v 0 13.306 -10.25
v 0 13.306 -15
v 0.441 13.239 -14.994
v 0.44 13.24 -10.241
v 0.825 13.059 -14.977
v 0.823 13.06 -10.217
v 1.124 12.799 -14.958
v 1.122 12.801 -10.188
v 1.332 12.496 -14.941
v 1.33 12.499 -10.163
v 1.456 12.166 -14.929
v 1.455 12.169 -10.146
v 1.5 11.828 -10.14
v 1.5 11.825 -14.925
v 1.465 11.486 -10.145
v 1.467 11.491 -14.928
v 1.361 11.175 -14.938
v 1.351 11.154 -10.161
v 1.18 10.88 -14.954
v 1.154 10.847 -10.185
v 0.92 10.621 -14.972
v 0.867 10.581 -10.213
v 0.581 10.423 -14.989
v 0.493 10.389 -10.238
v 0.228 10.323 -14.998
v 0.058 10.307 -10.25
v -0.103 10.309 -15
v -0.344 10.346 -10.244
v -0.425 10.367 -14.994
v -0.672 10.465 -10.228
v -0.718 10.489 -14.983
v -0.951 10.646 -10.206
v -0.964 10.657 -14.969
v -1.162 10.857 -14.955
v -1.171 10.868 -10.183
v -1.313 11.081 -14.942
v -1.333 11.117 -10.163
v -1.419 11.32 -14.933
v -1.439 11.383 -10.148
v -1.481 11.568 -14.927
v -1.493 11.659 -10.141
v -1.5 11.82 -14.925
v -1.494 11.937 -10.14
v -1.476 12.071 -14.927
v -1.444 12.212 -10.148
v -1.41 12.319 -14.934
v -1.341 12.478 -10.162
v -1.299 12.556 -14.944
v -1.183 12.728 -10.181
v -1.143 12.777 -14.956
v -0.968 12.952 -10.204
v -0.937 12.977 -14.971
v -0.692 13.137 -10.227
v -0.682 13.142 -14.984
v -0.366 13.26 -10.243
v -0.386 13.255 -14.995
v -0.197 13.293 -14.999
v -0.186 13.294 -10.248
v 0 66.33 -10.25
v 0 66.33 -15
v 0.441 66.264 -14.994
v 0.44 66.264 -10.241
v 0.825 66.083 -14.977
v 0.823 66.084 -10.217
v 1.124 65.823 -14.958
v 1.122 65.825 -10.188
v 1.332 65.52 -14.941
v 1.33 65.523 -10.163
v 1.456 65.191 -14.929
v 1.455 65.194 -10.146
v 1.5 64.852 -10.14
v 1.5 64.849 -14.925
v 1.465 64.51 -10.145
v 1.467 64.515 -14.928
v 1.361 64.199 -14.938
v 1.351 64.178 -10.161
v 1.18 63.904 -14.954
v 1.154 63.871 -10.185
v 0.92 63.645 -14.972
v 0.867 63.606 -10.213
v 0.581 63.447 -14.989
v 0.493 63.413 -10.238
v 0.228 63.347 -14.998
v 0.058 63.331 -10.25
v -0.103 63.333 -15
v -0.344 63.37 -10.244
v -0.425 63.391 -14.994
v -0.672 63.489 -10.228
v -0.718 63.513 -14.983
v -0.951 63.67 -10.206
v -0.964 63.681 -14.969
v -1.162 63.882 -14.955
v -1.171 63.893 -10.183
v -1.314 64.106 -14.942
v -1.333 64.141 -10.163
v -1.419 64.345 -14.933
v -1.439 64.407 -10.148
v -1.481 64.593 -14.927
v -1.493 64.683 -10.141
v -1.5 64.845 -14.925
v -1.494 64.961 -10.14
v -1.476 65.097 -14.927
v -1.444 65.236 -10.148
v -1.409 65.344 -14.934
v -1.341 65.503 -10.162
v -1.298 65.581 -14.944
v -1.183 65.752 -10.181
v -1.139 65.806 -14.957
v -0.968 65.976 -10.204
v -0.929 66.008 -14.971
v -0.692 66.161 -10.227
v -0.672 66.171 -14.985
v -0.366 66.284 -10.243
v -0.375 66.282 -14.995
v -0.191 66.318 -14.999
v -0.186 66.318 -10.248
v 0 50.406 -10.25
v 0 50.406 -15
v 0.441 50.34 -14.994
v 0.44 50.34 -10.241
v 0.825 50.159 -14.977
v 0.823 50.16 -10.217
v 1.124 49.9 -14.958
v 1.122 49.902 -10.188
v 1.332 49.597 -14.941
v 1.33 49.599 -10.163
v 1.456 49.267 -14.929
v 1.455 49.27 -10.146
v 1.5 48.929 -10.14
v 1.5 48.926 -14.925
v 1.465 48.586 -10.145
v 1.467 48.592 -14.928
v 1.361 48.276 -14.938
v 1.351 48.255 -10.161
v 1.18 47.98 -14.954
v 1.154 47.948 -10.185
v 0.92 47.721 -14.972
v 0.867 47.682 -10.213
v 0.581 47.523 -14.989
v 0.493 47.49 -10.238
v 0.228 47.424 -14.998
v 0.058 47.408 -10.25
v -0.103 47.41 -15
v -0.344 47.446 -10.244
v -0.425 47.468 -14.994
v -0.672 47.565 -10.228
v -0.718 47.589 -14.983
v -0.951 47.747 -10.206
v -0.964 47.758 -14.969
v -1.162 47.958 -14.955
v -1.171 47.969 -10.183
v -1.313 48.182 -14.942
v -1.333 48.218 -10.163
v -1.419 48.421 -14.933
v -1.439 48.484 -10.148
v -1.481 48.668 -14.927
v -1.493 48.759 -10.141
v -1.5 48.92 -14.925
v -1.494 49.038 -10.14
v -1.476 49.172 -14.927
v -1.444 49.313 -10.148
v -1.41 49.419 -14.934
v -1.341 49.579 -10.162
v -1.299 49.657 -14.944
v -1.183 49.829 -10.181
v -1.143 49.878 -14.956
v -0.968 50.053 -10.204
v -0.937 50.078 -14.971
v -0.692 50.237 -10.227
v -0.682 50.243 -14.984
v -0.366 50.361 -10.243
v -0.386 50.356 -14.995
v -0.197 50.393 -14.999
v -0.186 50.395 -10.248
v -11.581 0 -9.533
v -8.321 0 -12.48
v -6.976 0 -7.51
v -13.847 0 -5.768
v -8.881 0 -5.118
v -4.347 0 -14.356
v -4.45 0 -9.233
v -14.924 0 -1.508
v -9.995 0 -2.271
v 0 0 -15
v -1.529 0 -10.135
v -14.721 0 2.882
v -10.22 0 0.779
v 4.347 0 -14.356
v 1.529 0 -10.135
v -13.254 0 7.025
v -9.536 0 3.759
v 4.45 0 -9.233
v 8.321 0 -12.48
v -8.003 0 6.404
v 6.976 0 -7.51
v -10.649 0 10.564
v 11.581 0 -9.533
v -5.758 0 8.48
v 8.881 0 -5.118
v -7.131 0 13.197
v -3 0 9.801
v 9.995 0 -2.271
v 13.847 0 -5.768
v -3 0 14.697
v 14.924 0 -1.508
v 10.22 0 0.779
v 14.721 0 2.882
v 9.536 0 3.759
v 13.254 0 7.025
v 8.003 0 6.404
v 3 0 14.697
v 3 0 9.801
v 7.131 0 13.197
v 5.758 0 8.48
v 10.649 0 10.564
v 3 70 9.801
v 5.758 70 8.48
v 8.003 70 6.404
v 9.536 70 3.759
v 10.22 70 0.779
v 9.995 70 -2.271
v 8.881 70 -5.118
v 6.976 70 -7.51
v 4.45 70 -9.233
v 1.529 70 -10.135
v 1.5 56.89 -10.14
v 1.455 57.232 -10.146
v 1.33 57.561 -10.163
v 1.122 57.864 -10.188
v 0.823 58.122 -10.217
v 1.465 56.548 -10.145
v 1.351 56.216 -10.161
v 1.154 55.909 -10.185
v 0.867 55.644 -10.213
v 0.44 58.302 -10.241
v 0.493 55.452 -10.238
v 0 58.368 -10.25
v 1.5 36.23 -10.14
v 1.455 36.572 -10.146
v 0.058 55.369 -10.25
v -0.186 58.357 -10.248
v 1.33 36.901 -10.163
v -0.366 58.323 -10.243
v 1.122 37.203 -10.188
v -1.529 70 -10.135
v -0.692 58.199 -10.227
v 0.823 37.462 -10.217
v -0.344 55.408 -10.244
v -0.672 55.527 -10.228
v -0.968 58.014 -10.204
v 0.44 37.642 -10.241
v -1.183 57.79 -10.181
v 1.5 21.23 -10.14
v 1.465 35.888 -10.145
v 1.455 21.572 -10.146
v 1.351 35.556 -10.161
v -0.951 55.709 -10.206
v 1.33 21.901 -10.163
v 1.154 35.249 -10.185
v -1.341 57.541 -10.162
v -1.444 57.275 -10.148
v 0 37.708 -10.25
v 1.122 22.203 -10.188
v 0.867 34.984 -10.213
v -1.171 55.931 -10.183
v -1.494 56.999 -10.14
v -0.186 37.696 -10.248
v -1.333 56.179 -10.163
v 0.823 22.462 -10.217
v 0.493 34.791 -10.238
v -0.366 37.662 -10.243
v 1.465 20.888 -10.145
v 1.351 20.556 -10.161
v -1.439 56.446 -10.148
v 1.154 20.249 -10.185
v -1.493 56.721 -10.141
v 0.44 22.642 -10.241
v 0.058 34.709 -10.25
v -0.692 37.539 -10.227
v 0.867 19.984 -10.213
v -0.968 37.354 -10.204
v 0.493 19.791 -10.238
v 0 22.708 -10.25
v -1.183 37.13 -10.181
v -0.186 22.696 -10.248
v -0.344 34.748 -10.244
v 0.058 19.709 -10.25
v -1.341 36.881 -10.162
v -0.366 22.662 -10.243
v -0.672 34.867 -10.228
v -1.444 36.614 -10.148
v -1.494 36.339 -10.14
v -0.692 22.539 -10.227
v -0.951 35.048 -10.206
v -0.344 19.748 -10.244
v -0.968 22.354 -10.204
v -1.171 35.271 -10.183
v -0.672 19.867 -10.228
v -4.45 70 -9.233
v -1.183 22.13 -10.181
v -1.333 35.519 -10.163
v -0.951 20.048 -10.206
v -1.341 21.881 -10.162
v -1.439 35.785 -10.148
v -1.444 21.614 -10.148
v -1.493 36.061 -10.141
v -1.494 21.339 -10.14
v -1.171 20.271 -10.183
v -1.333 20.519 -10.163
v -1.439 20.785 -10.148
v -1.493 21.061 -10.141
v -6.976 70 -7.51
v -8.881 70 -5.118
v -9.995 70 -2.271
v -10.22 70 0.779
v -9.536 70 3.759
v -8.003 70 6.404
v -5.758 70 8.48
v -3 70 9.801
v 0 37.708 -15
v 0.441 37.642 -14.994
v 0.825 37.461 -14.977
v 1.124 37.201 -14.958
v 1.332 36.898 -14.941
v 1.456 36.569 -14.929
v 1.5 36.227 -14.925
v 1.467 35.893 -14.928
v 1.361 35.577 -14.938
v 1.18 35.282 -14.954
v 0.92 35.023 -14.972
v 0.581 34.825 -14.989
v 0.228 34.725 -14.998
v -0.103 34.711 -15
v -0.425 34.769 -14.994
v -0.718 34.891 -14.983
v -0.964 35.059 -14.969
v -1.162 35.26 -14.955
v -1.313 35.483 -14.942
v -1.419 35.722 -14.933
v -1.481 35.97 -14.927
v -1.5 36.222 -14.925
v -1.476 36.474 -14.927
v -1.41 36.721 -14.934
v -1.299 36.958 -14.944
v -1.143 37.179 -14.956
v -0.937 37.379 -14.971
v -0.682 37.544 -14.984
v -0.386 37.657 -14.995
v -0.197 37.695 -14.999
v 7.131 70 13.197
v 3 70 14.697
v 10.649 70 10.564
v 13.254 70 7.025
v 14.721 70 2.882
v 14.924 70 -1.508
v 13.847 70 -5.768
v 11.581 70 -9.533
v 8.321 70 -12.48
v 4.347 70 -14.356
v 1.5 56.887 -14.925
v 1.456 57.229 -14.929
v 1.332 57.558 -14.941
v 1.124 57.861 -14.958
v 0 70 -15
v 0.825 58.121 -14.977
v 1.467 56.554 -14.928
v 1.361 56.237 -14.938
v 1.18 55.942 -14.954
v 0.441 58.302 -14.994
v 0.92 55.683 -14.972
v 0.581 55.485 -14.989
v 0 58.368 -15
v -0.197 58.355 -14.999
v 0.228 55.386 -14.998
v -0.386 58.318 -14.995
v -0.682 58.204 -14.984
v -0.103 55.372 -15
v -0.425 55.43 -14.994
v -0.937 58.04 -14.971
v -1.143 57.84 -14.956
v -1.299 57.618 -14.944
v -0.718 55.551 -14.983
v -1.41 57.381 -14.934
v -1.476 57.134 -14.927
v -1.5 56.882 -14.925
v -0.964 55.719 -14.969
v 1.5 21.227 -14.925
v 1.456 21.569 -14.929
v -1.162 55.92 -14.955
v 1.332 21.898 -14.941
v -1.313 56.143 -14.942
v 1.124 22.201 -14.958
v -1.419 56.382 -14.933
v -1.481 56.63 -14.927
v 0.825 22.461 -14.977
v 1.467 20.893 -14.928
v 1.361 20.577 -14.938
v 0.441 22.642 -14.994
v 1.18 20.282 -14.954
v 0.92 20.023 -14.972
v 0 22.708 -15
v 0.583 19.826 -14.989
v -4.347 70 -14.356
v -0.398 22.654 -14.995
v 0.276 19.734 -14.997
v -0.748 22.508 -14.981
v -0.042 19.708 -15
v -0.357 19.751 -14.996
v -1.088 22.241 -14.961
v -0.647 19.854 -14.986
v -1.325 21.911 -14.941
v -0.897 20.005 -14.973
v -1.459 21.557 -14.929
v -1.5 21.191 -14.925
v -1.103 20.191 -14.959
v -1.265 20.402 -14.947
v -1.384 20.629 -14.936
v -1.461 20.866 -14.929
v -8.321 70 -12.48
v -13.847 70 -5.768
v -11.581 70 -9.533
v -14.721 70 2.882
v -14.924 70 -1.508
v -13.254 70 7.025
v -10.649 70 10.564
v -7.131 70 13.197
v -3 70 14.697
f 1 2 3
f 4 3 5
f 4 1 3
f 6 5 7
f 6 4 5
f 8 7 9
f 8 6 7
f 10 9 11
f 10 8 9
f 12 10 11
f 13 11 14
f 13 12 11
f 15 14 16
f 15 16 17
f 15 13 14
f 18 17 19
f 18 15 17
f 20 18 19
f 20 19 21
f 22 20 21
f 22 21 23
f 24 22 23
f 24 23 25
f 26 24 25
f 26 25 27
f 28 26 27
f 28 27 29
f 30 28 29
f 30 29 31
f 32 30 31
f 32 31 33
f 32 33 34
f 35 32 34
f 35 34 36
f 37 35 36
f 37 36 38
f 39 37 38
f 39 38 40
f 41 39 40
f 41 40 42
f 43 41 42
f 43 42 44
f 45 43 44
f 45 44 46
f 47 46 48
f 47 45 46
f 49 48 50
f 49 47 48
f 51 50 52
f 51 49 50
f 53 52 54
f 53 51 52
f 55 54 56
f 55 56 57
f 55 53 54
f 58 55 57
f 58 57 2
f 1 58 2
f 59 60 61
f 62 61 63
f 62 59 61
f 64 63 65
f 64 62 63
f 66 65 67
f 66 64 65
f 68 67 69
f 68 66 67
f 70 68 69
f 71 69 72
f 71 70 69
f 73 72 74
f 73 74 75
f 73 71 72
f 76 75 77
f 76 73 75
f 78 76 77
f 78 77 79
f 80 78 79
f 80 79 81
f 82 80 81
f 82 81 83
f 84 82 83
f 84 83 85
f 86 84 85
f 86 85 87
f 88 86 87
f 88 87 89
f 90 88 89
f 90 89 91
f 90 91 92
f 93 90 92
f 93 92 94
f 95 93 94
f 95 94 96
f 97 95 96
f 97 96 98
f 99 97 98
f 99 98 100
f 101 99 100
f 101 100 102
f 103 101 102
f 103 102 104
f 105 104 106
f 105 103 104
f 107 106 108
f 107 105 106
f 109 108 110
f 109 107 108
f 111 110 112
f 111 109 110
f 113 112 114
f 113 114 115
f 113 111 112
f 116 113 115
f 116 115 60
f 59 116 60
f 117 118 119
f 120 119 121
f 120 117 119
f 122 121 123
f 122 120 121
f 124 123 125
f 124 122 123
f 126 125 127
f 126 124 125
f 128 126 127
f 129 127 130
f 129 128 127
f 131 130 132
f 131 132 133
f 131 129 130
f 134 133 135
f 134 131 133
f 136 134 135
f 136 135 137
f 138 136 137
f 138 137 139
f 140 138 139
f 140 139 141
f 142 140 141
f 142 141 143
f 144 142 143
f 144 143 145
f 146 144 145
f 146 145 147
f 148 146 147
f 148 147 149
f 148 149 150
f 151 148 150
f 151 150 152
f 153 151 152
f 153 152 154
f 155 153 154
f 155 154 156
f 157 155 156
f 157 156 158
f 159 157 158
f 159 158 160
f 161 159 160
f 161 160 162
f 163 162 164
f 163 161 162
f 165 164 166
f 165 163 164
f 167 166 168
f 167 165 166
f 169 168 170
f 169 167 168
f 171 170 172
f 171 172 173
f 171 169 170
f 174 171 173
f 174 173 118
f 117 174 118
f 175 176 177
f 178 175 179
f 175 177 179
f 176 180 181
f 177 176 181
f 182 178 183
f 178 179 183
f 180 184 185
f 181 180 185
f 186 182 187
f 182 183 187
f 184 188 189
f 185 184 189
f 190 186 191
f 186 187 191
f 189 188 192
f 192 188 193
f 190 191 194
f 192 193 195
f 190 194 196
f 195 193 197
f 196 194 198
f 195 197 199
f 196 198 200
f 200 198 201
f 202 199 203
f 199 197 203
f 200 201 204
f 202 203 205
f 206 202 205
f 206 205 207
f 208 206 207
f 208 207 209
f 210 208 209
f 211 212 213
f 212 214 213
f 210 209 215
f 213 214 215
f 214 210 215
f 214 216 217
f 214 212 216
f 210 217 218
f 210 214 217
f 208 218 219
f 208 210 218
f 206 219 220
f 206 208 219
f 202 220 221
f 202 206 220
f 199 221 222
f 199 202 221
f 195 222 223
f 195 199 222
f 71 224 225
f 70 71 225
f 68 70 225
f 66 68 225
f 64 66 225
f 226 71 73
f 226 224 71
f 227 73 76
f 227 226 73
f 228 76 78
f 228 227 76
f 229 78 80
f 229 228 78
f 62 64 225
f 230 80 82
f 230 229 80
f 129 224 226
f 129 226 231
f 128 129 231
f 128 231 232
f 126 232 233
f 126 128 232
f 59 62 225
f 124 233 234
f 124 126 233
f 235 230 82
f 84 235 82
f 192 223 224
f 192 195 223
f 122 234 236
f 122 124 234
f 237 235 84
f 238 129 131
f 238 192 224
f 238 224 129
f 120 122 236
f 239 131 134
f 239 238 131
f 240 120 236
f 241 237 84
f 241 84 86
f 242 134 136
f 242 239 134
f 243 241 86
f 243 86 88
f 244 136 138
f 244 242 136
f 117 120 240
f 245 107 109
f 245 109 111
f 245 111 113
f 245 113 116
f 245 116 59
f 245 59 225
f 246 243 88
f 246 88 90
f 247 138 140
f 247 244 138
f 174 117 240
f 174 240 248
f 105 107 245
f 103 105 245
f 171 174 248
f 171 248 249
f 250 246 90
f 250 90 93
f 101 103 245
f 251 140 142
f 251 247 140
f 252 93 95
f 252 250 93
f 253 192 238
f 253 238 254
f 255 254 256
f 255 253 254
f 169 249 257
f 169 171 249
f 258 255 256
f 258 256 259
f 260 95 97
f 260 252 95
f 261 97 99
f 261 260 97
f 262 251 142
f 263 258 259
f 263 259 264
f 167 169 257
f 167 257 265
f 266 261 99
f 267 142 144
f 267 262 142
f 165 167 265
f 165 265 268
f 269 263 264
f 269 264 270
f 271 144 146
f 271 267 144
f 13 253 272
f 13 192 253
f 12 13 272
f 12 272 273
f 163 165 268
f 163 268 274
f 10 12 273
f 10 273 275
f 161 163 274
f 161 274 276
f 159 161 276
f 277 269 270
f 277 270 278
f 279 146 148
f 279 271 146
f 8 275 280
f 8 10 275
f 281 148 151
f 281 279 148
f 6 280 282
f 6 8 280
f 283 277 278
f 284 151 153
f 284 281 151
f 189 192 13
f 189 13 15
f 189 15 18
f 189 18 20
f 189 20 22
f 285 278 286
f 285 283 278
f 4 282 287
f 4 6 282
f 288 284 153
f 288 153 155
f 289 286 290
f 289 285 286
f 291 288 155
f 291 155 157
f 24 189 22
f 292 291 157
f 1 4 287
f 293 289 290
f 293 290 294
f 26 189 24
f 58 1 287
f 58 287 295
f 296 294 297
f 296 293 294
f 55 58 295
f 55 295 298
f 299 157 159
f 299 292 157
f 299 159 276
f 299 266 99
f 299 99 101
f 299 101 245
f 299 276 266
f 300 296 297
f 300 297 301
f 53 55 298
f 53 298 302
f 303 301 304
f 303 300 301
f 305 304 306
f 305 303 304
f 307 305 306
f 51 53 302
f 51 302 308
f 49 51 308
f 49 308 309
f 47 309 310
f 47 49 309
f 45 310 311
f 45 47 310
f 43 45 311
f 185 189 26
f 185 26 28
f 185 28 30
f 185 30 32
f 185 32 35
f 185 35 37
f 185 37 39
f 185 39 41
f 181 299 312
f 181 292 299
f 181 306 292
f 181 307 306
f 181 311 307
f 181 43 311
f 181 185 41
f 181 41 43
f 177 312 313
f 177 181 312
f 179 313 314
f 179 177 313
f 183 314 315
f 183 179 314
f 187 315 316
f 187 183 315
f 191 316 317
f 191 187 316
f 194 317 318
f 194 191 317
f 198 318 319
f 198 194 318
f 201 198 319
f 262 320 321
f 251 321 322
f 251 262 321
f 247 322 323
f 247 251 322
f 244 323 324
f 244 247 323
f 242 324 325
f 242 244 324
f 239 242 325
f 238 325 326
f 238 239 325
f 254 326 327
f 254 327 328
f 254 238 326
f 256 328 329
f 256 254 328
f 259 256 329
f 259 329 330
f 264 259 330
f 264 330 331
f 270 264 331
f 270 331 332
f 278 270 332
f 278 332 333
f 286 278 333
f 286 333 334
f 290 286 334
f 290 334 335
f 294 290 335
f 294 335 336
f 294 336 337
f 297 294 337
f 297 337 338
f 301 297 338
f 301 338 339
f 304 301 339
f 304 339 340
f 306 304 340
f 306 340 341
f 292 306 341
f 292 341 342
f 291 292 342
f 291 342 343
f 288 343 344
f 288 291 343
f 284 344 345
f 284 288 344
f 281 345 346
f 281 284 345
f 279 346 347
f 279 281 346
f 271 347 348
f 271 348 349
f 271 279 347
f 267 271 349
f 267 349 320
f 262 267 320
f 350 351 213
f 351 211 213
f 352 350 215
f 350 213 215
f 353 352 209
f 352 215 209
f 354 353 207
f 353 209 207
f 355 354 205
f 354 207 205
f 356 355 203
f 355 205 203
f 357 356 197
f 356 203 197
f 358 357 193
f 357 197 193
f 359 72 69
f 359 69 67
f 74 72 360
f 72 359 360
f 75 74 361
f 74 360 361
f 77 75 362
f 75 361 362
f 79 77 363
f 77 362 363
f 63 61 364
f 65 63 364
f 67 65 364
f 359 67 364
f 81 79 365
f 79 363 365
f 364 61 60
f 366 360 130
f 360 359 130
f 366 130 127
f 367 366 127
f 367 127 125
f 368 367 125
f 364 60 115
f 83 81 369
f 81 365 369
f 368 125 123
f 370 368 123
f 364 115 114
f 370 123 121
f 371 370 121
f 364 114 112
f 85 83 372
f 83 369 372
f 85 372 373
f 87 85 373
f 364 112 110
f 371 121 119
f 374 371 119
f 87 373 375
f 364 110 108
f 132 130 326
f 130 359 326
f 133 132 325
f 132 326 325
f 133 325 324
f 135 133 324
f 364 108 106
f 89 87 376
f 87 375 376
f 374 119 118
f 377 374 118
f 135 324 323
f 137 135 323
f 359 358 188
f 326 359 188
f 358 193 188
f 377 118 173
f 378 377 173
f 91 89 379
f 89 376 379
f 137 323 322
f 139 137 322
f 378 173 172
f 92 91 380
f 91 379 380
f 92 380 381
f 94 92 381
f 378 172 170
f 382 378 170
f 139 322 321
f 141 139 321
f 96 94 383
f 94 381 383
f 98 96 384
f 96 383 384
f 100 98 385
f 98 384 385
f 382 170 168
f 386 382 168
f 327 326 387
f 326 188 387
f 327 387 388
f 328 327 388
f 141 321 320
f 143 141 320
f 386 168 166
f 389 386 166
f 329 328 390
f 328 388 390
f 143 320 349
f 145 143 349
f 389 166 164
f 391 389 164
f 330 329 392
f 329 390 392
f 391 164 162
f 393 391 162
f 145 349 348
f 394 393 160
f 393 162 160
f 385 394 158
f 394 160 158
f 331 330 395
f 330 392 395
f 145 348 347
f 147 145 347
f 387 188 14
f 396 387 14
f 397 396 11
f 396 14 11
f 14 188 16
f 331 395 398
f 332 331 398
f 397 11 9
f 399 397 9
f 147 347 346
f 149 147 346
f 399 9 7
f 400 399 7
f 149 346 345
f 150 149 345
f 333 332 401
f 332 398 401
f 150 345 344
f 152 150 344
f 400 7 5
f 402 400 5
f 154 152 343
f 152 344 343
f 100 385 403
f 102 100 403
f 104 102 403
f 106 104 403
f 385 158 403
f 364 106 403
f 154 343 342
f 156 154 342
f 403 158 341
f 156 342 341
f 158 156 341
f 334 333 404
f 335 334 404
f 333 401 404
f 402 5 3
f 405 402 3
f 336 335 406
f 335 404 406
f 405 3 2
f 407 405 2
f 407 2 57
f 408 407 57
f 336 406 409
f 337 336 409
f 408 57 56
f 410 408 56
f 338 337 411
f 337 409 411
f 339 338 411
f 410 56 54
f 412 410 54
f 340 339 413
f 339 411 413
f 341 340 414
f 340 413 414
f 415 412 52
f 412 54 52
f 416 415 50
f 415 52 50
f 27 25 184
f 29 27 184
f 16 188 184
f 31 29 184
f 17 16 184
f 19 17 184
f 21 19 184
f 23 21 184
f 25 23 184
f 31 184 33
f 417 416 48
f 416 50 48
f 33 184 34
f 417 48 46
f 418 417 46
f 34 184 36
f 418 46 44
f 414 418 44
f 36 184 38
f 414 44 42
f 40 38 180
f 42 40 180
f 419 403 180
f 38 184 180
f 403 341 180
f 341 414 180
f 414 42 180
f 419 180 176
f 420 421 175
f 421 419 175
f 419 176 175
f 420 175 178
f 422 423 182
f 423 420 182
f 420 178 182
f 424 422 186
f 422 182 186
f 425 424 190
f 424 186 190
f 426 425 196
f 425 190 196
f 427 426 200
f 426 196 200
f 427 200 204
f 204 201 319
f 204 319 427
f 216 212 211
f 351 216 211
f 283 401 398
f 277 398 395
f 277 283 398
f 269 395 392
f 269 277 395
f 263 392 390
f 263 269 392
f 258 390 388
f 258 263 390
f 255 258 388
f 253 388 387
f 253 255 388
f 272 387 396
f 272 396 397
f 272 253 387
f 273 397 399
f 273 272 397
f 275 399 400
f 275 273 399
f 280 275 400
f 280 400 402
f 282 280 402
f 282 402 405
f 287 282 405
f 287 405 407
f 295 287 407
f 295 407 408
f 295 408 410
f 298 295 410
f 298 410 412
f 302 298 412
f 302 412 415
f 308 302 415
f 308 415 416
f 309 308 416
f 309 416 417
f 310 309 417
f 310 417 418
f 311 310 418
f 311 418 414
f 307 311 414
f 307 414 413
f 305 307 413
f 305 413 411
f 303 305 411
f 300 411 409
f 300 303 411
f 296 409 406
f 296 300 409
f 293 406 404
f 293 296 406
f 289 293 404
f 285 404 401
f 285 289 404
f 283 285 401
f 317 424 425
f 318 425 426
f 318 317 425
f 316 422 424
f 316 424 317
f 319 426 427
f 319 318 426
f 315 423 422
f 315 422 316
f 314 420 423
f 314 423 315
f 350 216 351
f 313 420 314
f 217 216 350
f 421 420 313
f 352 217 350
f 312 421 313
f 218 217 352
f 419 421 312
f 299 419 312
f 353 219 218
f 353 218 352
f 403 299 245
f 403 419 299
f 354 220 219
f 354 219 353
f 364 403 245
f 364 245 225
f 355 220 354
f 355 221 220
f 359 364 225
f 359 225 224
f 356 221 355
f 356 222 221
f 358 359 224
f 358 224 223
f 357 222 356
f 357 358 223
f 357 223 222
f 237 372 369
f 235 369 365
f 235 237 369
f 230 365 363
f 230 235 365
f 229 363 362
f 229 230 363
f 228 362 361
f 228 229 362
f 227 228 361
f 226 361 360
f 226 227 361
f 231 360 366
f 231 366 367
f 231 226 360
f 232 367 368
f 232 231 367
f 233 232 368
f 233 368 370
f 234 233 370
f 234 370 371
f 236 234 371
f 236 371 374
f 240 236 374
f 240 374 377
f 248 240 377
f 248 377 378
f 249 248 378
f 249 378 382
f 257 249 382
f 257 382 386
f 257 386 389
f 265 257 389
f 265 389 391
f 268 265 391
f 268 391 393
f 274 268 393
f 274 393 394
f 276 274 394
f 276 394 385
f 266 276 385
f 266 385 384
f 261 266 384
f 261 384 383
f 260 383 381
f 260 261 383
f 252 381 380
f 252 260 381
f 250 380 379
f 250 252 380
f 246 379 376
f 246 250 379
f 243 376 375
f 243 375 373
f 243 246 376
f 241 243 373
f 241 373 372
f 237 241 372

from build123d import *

# Parameters (mm, degrees)
SKETCH_1_R               = 15
SKETCH_1_R_2             = 10.25
EXTRUDE_1_DEPTH          = 150
CUT_EXTRUDE_1_DEPTH      = 154.703965854
CUT_EXTRUDE_1_DEPTH_BACK = 154.703965854
SKETCH_2_R               = 1.5
SKETCH_3_R               = 22.14266171
CUT_EXTRUDE_2_DEPTH      = 80
SKETCH_5_W               = 6
SKETCH_5_H               = 5.980913868
CUT_EXTRUDE_3_DEPTH      = 80


with BuildPart() as part:
    # 스케치1 → 보스-돌출1 (new body)
    with BuildSketch(Plane(origin=(0, 0, 0), x_dir=(1, 0, 0), z_dir=(0, 1, 0))):
        with Locations(Location((0, 0, 0), (0, 0, 270))):
            Circle(SKETCH_1_R)
        with Locations(Location((0, 0, 0), (0, 0, 270))):
            Circle(SKETCH_1_R_2, mode=Mode.SUBTRACT)
    extrude(amount=EXTRUDE_1_DEPTH)

    # 스케치2 → 컷-돌출1 (cut, two sides: drawn at the far end of the back side and taken through both)
    with BuildSketch(Plane(origin=(0, 0, -14.998485281), x_dir=(-1, 0, 0), z_dir=(0, 0, -1)).offset(-CUT_EXTRUDE_1_DEPTH_BACK)):
        with Locations(Location((0, 11.805761924, 0), (0, 0, 90))):
            Circle(SKETCH_2_R)
        with Locations(Location((0, 21.207864132, 0), (0, 0, 90))):
            Circle(SKETCH_2_R)
        with Locations(Location((0, 36.207864132, 0), (0, 0, 90))):
            Circle(SKETCH_2_R)
        with Locations(Location((0, 48.906437248, 0), (0, 0, 90))):
            Circle(SKETCH_2_R)
        with Locations(Location((0, 56.868147497, 0), (0, 0, 90))):
            Circle(SKETCH_2_R)
        with Locations(Location((0, 64.829857746, 0), (0, 0, 90))):
            Circle(SKETCH_2_R)
        with Locations(Location((0, 77.054405077, 0), (0, 0, 90))):
            Circle(SKETCH_2_R)
        with Locations(Location((0, 91.899672592, 0), (0, 0, 90))):
            Circle(SKETCH_2_R)
        with Locations(Location((0, 106.761531723, 0), (0, 0, 90))):
            Circle(SKETCH_2_R)
        with Locations(Location((0, 122.331098432, 0), (0, 0, 90))):
            Circle(SKETCH_2_R)
        with Locations(Location((0, 136.839103775, 0), (0, 0, 90))):
            Circle(SKETCH_2_R)
    extrude(amount=CUT_EXTRUDE_1_DEPTH + CUT_EXTRUDE_1_DEPTH_BACK, mode=Mode.SUBTRACT)

    # 스케치3 → 컷-돌출2 (cut)
    with BuildSketch(Plane(origin=(0, 150, 0), x_dir=(1, 0, 0), z_dir=(0, 1, 0))):
        Circle(SKETCH_3_R)
    extrude(amount=-CUT_EXTRUDE_2_DEPTH, mode=Mode.SUBTRACT)

    # 스케치5 → 컷-돌출3 (cut)
    with BuildSketch(Plane.XZ):
        with Locations((0, 12.107840203)):
            Rectangle(SKETCH_5_W, SKETCH_5_H)
    extrude(amount=-CUT_EXTRUDE_3_DEPTH, mode=Mode.SUBTRACT)


solid = part.part
